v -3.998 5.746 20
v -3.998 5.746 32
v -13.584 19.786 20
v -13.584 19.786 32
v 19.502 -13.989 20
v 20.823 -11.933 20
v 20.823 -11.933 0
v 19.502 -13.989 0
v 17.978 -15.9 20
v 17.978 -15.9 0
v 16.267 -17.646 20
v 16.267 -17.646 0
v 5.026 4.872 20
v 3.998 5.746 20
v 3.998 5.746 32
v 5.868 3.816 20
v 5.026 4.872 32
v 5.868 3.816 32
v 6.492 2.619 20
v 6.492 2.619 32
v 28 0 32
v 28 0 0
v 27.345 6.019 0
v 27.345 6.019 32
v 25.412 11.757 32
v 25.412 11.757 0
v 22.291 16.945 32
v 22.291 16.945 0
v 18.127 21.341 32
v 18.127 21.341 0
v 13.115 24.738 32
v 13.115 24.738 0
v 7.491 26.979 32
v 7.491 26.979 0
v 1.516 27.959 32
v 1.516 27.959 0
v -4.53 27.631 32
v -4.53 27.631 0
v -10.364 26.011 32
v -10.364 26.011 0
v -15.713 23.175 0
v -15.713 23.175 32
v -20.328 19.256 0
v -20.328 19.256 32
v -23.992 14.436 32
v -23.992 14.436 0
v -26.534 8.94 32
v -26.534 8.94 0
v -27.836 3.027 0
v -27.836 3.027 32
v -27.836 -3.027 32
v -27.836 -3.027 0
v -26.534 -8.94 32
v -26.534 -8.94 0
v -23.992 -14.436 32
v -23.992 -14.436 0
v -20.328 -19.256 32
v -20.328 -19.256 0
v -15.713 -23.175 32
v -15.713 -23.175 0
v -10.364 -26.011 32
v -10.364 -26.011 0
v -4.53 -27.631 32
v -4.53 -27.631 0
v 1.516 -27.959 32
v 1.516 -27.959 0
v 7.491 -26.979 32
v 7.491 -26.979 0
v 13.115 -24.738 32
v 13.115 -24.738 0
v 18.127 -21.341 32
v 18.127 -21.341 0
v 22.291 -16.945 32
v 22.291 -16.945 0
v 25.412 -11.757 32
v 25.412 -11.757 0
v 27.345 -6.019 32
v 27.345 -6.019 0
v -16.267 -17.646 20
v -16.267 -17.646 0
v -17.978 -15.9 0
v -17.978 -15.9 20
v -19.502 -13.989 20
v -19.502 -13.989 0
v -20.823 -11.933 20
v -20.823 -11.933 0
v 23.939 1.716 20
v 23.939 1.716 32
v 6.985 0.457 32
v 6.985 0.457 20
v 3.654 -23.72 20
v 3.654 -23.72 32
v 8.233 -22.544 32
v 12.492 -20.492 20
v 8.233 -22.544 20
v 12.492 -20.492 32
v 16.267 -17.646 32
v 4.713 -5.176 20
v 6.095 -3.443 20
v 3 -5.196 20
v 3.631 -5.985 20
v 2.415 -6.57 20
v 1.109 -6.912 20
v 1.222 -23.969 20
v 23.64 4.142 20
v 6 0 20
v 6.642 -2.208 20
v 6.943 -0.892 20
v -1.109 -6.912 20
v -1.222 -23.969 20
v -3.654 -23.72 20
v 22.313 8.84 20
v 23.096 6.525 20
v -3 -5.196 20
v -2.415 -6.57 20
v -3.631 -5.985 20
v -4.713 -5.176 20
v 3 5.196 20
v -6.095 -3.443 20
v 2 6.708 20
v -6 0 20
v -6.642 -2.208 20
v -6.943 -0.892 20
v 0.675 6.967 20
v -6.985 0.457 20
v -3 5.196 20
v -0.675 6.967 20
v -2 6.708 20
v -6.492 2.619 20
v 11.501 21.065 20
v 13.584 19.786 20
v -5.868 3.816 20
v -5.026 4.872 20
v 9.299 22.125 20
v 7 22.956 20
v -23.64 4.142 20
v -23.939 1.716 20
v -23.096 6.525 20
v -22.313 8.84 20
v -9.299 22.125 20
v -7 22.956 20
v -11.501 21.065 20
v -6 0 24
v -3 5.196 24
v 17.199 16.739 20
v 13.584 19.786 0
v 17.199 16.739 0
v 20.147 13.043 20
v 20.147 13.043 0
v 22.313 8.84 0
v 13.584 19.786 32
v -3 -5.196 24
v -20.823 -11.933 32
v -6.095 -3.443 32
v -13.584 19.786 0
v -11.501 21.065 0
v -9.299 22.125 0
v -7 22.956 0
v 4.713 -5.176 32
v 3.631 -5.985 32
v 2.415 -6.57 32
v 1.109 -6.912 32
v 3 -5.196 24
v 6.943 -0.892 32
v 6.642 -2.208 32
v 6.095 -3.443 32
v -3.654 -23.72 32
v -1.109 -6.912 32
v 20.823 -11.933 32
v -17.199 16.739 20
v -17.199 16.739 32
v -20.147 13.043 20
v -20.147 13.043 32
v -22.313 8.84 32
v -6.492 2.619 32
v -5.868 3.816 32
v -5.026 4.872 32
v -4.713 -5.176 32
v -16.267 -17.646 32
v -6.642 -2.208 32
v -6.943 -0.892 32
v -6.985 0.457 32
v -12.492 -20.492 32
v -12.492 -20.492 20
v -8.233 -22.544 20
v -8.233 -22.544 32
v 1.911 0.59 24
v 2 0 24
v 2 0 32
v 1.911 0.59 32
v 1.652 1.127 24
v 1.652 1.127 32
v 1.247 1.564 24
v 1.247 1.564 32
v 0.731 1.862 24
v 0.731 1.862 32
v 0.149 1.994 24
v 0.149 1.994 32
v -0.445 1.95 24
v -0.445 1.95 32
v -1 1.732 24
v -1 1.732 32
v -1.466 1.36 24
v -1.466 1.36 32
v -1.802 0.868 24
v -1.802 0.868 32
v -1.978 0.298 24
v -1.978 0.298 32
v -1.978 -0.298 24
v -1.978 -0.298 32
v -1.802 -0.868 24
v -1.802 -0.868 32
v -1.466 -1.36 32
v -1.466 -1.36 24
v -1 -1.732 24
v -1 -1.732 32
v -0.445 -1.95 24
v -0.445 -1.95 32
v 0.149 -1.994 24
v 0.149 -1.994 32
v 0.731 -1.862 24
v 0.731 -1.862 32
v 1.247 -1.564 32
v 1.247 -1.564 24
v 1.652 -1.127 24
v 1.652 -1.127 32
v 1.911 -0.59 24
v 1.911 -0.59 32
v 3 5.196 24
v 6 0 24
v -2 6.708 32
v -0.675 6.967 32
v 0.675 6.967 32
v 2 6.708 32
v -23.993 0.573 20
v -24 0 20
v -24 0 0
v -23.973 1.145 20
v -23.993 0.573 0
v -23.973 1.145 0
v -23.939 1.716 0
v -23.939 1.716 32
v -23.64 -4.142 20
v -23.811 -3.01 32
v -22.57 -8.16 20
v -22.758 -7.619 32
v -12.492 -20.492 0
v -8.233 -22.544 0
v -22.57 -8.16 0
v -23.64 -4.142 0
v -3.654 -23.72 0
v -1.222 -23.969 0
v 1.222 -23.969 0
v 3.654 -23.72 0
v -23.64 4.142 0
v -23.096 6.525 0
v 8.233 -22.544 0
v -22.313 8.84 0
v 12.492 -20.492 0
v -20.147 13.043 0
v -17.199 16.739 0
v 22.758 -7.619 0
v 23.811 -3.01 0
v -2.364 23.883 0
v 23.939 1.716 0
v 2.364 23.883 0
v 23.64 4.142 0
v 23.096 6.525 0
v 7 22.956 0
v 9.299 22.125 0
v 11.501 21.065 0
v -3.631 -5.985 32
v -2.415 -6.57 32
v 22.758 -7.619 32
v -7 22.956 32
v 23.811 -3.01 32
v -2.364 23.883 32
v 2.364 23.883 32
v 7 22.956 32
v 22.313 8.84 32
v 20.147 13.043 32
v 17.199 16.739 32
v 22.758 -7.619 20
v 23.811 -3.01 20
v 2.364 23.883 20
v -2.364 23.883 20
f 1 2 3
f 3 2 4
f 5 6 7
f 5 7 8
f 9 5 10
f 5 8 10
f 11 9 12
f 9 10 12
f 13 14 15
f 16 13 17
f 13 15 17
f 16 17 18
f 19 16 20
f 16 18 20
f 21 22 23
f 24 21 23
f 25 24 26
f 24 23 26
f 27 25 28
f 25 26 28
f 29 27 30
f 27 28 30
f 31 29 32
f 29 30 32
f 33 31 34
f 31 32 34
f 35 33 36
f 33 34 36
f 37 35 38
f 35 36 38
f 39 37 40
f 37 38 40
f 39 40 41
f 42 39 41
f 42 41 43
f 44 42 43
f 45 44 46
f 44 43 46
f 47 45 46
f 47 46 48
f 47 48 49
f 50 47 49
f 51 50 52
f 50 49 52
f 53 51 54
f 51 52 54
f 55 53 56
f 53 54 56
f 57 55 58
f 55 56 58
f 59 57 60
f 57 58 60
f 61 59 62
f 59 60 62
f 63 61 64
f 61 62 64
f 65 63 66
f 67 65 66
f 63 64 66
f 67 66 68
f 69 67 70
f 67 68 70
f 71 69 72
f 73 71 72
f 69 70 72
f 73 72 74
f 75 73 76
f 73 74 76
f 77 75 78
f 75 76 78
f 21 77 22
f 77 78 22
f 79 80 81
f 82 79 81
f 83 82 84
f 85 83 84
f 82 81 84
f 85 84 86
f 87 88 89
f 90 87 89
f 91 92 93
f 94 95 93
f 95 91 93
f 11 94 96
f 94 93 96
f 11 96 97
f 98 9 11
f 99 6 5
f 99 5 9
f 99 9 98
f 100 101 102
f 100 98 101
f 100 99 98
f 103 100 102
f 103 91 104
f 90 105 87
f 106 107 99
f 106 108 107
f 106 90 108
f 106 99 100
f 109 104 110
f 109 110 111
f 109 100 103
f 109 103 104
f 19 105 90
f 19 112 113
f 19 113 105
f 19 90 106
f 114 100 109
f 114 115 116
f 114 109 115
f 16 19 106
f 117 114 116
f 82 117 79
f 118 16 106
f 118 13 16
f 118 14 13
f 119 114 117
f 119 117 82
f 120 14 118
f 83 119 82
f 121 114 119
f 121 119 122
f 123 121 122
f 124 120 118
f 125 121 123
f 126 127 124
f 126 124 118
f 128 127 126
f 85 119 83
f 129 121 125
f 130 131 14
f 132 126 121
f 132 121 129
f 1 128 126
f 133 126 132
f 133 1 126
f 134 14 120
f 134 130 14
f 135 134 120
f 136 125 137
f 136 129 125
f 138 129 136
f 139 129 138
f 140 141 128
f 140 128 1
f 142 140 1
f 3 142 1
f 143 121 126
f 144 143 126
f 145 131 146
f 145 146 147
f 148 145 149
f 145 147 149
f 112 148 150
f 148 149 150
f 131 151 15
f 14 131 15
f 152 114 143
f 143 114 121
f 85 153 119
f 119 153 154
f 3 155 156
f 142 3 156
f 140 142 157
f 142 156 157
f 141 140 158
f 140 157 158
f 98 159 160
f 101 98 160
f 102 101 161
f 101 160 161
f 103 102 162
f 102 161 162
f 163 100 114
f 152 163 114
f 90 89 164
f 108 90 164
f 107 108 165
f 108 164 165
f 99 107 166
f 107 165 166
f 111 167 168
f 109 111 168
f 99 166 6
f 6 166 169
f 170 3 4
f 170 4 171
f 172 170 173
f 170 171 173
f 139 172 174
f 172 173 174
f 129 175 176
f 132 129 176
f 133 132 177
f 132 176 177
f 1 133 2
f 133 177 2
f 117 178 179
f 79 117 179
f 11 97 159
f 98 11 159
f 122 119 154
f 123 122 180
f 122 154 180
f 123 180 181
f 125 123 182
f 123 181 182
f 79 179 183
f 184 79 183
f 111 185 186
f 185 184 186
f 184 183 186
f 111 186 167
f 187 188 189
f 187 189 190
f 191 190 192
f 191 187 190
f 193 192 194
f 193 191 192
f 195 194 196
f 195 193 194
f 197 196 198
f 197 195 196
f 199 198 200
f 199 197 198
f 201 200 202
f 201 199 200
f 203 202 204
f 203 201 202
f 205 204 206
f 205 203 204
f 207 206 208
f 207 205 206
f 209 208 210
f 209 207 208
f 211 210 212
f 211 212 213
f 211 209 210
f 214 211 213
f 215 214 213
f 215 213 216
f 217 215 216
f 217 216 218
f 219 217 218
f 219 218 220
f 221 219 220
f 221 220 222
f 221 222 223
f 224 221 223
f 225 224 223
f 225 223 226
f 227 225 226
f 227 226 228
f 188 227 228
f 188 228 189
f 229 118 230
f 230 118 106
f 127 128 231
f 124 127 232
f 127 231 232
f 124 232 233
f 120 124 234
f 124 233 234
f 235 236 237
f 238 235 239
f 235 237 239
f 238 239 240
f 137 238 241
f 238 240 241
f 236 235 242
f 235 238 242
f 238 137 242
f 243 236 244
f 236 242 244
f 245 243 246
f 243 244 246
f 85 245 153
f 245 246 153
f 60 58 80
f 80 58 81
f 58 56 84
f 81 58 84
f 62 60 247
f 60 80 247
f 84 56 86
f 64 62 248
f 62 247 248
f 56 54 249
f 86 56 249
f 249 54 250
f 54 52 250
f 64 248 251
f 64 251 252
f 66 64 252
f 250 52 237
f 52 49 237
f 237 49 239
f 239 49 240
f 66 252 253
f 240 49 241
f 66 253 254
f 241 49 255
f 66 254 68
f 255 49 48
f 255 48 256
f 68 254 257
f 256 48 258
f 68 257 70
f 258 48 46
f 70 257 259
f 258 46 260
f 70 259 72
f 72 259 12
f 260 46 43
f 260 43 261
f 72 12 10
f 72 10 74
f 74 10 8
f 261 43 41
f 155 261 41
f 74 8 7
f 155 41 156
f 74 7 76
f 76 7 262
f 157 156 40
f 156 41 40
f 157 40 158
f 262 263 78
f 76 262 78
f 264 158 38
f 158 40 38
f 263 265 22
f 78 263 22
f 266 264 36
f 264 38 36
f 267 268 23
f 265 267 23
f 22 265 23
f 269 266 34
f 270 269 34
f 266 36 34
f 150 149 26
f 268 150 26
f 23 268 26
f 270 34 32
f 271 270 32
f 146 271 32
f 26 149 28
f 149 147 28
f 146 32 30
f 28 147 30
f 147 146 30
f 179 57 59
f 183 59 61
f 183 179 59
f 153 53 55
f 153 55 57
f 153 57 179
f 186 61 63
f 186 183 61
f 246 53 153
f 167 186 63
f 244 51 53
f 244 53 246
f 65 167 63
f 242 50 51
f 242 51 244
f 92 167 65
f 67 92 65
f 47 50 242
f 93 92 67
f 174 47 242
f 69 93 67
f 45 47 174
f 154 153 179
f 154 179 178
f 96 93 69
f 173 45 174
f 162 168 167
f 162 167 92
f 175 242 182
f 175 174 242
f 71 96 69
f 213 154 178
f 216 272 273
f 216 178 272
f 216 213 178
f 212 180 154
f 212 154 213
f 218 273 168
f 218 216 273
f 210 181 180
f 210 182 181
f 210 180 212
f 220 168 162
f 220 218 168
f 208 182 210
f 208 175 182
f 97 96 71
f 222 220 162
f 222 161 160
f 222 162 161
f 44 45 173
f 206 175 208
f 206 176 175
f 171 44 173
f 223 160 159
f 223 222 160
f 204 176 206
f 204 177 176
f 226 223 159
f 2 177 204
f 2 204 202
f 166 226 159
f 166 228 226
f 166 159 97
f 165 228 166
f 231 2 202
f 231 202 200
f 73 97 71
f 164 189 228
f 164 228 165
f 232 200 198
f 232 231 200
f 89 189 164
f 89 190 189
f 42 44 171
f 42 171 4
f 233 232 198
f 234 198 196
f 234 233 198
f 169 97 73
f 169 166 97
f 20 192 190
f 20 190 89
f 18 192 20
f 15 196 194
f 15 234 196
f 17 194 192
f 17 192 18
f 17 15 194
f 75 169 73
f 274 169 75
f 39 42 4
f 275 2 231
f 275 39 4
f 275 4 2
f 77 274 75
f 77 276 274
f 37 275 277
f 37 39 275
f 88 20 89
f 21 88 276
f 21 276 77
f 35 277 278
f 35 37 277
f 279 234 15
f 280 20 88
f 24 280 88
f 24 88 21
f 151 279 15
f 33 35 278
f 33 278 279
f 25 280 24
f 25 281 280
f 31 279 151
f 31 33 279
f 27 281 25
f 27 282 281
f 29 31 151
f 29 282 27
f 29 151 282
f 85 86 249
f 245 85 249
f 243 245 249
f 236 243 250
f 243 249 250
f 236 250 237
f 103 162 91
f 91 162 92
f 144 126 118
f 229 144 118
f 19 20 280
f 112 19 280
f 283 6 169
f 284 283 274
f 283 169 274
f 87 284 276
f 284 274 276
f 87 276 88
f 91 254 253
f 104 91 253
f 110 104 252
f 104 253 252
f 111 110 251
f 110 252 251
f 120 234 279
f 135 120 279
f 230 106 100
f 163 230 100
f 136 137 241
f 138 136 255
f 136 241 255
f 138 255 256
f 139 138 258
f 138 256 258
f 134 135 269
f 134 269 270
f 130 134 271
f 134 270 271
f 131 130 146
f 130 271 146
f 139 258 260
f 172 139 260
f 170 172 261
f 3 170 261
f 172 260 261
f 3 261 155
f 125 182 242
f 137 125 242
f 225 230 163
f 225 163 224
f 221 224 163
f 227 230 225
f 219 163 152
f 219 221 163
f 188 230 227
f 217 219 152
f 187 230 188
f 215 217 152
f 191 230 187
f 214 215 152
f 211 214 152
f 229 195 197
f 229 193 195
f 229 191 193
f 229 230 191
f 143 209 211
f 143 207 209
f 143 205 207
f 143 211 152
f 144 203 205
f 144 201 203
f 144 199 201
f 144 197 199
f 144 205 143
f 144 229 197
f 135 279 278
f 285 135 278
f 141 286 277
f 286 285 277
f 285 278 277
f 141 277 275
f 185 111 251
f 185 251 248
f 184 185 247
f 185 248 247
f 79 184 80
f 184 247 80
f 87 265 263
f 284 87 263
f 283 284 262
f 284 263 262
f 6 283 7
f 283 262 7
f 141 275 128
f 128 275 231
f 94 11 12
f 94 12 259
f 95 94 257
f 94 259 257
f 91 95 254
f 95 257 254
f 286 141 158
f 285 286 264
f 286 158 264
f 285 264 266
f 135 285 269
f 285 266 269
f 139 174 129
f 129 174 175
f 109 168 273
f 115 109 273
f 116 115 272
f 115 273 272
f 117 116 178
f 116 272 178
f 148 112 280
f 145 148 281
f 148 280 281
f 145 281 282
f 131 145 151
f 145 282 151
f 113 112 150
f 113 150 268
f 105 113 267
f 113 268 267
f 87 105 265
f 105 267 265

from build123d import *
from build123d.topology import SkipClean

# Parameters (mm, degrees)
SKETCH1_R           = 28
SKETCH1_R_2         = 2
BOSS_EXTRUDE1_DEPTH = 32
SKETCH2_R           = 24
CUT_EXTRUDE1_DEPTH  = 20
CUT_EXTRUDE2_DEPTH  = 4
CUT_EXTRUDE4_DEPTH  = 51.911688245


with BuildPart() as part:
    # Sketch1 → Boss-Extrude1 (new body)
    with BuildSketch(Plane.XY):
        Circle(SKETCH1_R)
        Circle(SKETCH1_R_2, mode=Mode.SUBTRACT)
    extrude(amount=BOSS_EXTRUDE1_DEPTH)

    # Sketch2 → Cut-Extrude1 (cut)
    with BuildSketch(Plane(origin=(0, 0, 0), x_dir=(-1, 0, 0), z_dir=(0, 0, -1))):
        Circle(SKETCH2_R)
    extrude(amount=-CUT_EXTRUDE1_DEPTH, mode=Mode.SUBTRACT)

    # Sketch3 → Cut-Extrude2 (cut)
    with BuildSketch(Plane(origin=(0, 0, 20), x_dir=(-1, 0, 0), z_dir=(0, 0, -1))):
        Polygon((6, 0), (3, 5.196152423), (-3, 5.196152423), (-6, 0), (-3, -5.196152423), (3, -5.196152423), align=None)
    extrude(amount=-CUT_EXTRUDE2_DEPTH, mode=Mode.SUBTRACT)

    # Sketch5 → Cut-Extrude4 (cut, through all)
    with SkipClean():  # the faces are left unmerged after this step: merging them gives an invalid solid
        with BuildSketch(Plane.XY.offset(32)):
            with BuildLine():
                Line((-7, 22.956480566), (-2, 6.708203932))
                ThreePointArc((-2, 6.708203932), (0, 7), (2, 6.708203932))
                Line((2, 6.708203932), (7, 22.956480566))
                ThreePointArc((7, 22.956480566), (0, 24), (-7, 22.956480566))
            make_face()
            with BuildLine():
                Line((13.583670621, 19.785951897), (3.997705422, 5.746159706))
                ThreePointArc((3.997705422, 5.746159706), (5.472820377, 4.364428613), (6.491664629, 2.618833776))
                Line((6.491664629, 2.618833776), (22.312527847, 8.840311143))
                ThreePointArc((22.312527847, 8.840311143), (18.763955579, 14.963755245), (13.583670621, 19.785951897))
            make_face()
            with BuildLine():
                Line((23.938560207, 1.716197889), (6.985057122, 0.45714002))
                ThreePointArc((6.985057122, 0.45714002), (6.824495385, -1.557646538), (6.094973386, -3.442571629))
                Line((6.094973386, -3.442571629), (20.823267132, -11.932792881))
                ThreePointArc((20.823267132, -11.932792881), (23.398269892, -5.340502415), (23.938560207, 1.716197889))
            make_face()
            with BuildLine():
                Line((16.2672257, -17.645888133), (4.712518341, -5.176115424))
                ThreePointArc((4.712518341, -5.176115424), (3.037186174, -6.306782075), (1.108642869, -6.911650381))
                Line((1.108642869, -6.911650381), (3.65366155, -23.720260481))
                ThreePointArc((3.65366155, -23.720260481), (10.413209739, -21.62325283), (16.2672257, -17.645888133))
            make_face()
            with BuildLine():
                Line((-3.65366155, -23.720260481), (-1.108642869, -6.911650381))
                ThreePointArc((-1.108642869, -6.911650381), (-3.037186174, -6.306782075), (-4.712518341, -5.176115424))
                Line((-4.712518341, -5.176115424), (-16.2672257, -17.645888133))
                ThreePointArc((-16.2672257, -17.645888133), (-10.413209739, -21.62325283), (-3.65366155, -23.720260481))
            make_face()
            with BuildLine():
                Line((-20.823267132, -11.932792881), (-6.094973386, -3.442571629))
                ThreePointArc((-6.094973386, -3.442571629), (-6.824495385, -1.557646538), (-6.985057122, 0.45714002))
                Line((-6.985057122, 0.45714002), (-23.938560207, 1.716197889))
                ThreePointArc((-23.938560207, 1.716197889), (-23.398269892, -5.340502415), (-20.823267132, -11.932792881))
            make_face()
            with BuildLine():
                Line((-22.312527847, 8.840311143), (-6.491664629, 2.618833776))
                ThreePointArc((-6.491664629, 2.618833776), (-5.472820377, 4.364428613), (-3.997705422, 5.746159706))
                Line((-3.997705422, 5.746159706), (-13.583670621, 19.785951897))
                ThreePointArc((-13.583670621, 19.785951897), (-18.763955579, 14.963755245), (-22.312527847, 8.840311143))
            make_face()
        extrude(amount=-CUT_EXTRUDE4_DEPTH, mode=Mode.SUBTRACT)


solid = part.part
